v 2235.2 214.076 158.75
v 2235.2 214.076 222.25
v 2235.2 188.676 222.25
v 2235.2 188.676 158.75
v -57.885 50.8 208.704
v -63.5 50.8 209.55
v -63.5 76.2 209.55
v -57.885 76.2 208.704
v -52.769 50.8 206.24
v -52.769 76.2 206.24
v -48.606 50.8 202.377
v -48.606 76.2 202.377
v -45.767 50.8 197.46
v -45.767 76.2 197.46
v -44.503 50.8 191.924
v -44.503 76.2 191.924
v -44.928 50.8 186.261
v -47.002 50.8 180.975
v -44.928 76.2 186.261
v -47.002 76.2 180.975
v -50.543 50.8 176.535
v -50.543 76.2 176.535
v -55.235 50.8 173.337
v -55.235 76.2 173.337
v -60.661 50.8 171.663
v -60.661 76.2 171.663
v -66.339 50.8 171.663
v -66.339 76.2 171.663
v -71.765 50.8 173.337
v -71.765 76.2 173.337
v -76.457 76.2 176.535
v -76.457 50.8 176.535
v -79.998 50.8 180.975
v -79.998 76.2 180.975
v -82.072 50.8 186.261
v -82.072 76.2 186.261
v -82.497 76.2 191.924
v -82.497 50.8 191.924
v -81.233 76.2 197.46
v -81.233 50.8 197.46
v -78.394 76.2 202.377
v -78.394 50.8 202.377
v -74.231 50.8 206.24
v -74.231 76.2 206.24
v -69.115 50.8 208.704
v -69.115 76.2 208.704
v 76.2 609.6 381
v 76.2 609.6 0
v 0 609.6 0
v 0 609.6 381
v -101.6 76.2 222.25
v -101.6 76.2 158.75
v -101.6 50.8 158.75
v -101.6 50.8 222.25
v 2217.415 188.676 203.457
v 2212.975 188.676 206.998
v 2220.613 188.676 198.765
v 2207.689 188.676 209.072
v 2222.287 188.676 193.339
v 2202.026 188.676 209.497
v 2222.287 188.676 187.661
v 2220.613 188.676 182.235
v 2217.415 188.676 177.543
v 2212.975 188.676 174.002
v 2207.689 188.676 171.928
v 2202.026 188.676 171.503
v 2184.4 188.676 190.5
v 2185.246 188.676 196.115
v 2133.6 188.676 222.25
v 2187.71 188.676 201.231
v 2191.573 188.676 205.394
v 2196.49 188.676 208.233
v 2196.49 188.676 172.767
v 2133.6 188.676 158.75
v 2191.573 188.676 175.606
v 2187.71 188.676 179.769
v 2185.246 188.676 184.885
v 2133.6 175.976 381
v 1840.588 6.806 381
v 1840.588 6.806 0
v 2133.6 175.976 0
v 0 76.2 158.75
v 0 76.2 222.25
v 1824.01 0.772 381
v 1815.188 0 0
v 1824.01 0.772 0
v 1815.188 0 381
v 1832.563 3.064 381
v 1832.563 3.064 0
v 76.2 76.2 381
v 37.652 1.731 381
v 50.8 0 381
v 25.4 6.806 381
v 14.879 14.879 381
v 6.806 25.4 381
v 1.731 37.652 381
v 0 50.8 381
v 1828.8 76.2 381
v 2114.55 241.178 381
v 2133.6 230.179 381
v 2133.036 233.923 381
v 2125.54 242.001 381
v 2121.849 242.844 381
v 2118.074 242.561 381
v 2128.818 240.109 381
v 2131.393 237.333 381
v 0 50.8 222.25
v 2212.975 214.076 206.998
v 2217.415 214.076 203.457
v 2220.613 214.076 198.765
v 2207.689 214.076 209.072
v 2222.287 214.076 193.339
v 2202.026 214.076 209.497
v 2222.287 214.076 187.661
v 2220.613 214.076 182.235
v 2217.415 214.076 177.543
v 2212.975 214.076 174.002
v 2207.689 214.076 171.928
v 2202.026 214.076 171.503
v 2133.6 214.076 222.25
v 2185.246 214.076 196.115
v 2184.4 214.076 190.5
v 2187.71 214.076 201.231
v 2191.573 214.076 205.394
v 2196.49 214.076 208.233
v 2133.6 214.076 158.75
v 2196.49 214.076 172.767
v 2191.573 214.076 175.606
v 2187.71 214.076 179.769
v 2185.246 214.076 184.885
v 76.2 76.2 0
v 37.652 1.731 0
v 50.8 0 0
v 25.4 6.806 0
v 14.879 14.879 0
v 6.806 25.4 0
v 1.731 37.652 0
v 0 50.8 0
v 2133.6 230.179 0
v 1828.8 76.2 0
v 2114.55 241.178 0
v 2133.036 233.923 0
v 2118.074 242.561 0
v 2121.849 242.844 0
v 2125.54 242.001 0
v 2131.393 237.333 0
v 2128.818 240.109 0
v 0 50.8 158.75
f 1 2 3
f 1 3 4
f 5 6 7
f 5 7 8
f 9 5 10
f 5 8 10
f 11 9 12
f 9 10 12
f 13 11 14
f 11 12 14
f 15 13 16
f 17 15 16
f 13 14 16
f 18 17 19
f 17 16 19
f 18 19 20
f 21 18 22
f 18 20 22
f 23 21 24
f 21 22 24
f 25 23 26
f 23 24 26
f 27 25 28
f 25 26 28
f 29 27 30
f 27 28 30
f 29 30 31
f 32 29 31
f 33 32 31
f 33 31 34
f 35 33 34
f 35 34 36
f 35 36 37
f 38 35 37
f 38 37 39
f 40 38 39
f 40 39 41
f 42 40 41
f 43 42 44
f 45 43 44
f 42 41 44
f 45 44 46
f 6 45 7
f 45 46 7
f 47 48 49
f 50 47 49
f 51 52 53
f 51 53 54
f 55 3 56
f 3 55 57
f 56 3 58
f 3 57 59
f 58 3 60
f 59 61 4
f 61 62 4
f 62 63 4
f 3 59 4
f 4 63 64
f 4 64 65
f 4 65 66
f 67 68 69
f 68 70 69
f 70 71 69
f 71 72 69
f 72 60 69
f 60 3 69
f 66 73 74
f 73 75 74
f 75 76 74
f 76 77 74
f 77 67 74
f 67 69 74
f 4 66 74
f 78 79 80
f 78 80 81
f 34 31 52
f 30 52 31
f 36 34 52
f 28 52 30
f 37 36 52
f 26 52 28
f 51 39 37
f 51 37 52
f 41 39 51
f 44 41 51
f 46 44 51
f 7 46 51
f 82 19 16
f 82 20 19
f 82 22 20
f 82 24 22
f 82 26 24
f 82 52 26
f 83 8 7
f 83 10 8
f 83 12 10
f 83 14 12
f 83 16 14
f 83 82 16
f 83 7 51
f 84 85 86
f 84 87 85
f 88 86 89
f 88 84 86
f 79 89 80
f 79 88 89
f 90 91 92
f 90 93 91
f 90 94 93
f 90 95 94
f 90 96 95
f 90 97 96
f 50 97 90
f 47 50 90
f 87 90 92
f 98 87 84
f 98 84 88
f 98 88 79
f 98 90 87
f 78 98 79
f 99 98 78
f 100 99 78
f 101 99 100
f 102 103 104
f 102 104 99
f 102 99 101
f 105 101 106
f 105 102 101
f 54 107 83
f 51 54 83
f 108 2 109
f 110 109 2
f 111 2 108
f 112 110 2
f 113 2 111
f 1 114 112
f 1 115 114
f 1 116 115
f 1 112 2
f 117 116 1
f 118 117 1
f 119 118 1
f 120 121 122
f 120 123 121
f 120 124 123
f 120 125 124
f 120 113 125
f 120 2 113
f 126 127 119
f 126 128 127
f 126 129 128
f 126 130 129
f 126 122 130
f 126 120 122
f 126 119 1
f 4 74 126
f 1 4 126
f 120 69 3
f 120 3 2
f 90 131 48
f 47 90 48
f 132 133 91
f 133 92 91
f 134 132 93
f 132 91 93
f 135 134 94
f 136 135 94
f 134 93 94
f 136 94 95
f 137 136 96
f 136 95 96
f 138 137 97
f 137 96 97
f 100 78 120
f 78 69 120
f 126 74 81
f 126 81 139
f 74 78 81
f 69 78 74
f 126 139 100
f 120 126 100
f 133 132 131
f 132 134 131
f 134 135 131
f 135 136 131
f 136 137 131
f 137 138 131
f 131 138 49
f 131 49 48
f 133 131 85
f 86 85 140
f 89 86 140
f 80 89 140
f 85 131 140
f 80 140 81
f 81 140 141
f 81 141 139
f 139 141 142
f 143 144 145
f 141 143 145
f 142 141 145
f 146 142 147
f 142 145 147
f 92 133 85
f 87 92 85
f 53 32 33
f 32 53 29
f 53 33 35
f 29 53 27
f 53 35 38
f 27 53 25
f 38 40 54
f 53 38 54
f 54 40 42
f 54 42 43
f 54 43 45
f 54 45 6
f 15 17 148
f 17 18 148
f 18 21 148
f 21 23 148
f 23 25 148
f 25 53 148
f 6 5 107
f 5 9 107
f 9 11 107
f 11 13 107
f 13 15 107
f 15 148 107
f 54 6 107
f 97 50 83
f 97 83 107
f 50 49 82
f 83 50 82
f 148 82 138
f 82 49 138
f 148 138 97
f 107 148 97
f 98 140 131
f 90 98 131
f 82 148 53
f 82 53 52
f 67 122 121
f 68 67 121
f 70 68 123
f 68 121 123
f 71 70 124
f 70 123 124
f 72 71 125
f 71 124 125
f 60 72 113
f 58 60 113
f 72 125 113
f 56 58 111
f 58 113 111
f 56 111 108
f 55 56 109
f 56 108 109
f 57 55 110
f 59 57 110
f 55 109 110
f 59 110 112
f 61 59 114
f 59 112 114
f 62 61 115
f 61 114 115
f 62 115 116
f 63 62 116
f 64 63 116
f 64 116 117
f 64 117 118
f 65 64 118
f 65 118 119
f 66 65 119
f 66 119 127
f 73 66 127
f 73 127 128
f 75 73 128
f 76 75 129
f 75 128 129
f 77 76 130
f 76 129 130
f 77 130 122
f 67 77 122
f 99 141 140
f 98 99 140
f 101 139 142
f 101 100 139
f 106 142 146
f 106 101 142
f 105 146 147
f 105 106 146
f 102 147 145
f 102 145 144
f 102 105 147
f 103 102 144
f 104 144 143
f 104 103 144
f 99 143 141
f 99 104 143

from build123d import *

# Parameters (mm, degrees)
BOSS_EXTRUDE1_DEPTH = 381
SKETCH5_W           = 63.5
SKETCH5_H           = 25.4
BOSS_EXTRUDE4_DEPTH = 101.6
SKETCH6_R           = 19.05
CUT_EXTRUDE3_DEPTH  = 25.4
FILLET3_R           = 50.8
FILLET4_R           = 12.7
FILLET5_R           = 50.8
SKETCH7_W           = 63.5
SKETCH7_H           = 25.4
BOSS_EXTRUDE5_DEPTH = 101.6
SKETCH8_R           = 19.05
CUT_EXTRUDE4_DEPTH  = 25.4


with BuildPart() as part:
    # Sketch1 → Boss-Extrude1 (new body)
    with BuildSketch(Plane.XY):
        Polygon((0, 7.775510204), (0, 0), (6.220408163, 0), (1828.8, 0), (2133.6, 175.976362049), (2133.6, 252.176362049), (1828.8, 76.2), (76.2, 76.2), (76.2, 609.6), (0, 609.6), align=None)
    extrude(amount=BOSS_EXTRUDE1_DEPTH)

    # Sketch5 → Boss-Extrude4 (add)
    with BuildSketch(Plane.ZY):
        with Locations((190.5, 63.5)):
            Rectangle(SKETCH5_W, SKETCH5_H)
    extrude(amount=BOSS_EXTRUDE4_DEPTH)

    # Sketch6 → Cut-Extrude3 (cut)
    with BuildSketch(Plane(origin=(0, 76.2, 0), x_dir=(1, 0, 0), z_dir=(0, 1, 0))):
        with Locations(Location((-63.5, -190.5, 0), (0, 0, 270))):
            Circle(SKETCH6_R)
    extrude(amount=-CUT_EXTRUDE3_DEPTH, mode=Mode.SUBTRACT)

    # Fillet3
    fillet3_edges = [part.edges().sort_by_distance(p)[0] for p in [
        (1828.8, 0, 190.5),
    ]]
    fillet(fillet3_edges, radius=FILLET3_R)

    # Fillet4
    fillet4_edges = [part.edges().sort_by_distance(p)[0] for p in [
        (2133.6, 252.176362049, 190.5),
    ]]
    fillet(fillet4_edges, radius=FILLET4_R)

    # Fillet5
    fillet5_edges = [part.edges().sort_by_distance(p)[0] for p in [
        (0, 0, 190.5),
    ]]
    fillet(fillet5_edges, radius=FILLET5_R - 0.0001)  # a hair under: the kernel refuses the full size

    # Sketch7 → Boss-Extrude5 (add)
    with BuildSketch(Plane(origin=(2133.6, 0, 0), x_dir=(0, 0, -1), z_dir=(1, 0, 0))):
        with Locations((-190.5, 201.376362049)):
            Rectangle(SKETCH7_W, SKETCH7_H)
    extrude(amount=BOSS_EXTRUDE5_DEPTH)

    # Sketch8 → Cut-Extrude4 (cut)
    with BuildSketch(Plane(origin=(0, 214.076362049, 0), x_dir=(1, 0, 0), z_dir=(0, 1, 0))):
        with Locations(Location((2203.45, -190.5, 0), (0, 0, 180))):
            Circle(SKETCH8_R)
    extrude(amount=-CUT_EXTRUDE4_DEPTH, mode=Mode.SUBTRACT)


solid = part.part
